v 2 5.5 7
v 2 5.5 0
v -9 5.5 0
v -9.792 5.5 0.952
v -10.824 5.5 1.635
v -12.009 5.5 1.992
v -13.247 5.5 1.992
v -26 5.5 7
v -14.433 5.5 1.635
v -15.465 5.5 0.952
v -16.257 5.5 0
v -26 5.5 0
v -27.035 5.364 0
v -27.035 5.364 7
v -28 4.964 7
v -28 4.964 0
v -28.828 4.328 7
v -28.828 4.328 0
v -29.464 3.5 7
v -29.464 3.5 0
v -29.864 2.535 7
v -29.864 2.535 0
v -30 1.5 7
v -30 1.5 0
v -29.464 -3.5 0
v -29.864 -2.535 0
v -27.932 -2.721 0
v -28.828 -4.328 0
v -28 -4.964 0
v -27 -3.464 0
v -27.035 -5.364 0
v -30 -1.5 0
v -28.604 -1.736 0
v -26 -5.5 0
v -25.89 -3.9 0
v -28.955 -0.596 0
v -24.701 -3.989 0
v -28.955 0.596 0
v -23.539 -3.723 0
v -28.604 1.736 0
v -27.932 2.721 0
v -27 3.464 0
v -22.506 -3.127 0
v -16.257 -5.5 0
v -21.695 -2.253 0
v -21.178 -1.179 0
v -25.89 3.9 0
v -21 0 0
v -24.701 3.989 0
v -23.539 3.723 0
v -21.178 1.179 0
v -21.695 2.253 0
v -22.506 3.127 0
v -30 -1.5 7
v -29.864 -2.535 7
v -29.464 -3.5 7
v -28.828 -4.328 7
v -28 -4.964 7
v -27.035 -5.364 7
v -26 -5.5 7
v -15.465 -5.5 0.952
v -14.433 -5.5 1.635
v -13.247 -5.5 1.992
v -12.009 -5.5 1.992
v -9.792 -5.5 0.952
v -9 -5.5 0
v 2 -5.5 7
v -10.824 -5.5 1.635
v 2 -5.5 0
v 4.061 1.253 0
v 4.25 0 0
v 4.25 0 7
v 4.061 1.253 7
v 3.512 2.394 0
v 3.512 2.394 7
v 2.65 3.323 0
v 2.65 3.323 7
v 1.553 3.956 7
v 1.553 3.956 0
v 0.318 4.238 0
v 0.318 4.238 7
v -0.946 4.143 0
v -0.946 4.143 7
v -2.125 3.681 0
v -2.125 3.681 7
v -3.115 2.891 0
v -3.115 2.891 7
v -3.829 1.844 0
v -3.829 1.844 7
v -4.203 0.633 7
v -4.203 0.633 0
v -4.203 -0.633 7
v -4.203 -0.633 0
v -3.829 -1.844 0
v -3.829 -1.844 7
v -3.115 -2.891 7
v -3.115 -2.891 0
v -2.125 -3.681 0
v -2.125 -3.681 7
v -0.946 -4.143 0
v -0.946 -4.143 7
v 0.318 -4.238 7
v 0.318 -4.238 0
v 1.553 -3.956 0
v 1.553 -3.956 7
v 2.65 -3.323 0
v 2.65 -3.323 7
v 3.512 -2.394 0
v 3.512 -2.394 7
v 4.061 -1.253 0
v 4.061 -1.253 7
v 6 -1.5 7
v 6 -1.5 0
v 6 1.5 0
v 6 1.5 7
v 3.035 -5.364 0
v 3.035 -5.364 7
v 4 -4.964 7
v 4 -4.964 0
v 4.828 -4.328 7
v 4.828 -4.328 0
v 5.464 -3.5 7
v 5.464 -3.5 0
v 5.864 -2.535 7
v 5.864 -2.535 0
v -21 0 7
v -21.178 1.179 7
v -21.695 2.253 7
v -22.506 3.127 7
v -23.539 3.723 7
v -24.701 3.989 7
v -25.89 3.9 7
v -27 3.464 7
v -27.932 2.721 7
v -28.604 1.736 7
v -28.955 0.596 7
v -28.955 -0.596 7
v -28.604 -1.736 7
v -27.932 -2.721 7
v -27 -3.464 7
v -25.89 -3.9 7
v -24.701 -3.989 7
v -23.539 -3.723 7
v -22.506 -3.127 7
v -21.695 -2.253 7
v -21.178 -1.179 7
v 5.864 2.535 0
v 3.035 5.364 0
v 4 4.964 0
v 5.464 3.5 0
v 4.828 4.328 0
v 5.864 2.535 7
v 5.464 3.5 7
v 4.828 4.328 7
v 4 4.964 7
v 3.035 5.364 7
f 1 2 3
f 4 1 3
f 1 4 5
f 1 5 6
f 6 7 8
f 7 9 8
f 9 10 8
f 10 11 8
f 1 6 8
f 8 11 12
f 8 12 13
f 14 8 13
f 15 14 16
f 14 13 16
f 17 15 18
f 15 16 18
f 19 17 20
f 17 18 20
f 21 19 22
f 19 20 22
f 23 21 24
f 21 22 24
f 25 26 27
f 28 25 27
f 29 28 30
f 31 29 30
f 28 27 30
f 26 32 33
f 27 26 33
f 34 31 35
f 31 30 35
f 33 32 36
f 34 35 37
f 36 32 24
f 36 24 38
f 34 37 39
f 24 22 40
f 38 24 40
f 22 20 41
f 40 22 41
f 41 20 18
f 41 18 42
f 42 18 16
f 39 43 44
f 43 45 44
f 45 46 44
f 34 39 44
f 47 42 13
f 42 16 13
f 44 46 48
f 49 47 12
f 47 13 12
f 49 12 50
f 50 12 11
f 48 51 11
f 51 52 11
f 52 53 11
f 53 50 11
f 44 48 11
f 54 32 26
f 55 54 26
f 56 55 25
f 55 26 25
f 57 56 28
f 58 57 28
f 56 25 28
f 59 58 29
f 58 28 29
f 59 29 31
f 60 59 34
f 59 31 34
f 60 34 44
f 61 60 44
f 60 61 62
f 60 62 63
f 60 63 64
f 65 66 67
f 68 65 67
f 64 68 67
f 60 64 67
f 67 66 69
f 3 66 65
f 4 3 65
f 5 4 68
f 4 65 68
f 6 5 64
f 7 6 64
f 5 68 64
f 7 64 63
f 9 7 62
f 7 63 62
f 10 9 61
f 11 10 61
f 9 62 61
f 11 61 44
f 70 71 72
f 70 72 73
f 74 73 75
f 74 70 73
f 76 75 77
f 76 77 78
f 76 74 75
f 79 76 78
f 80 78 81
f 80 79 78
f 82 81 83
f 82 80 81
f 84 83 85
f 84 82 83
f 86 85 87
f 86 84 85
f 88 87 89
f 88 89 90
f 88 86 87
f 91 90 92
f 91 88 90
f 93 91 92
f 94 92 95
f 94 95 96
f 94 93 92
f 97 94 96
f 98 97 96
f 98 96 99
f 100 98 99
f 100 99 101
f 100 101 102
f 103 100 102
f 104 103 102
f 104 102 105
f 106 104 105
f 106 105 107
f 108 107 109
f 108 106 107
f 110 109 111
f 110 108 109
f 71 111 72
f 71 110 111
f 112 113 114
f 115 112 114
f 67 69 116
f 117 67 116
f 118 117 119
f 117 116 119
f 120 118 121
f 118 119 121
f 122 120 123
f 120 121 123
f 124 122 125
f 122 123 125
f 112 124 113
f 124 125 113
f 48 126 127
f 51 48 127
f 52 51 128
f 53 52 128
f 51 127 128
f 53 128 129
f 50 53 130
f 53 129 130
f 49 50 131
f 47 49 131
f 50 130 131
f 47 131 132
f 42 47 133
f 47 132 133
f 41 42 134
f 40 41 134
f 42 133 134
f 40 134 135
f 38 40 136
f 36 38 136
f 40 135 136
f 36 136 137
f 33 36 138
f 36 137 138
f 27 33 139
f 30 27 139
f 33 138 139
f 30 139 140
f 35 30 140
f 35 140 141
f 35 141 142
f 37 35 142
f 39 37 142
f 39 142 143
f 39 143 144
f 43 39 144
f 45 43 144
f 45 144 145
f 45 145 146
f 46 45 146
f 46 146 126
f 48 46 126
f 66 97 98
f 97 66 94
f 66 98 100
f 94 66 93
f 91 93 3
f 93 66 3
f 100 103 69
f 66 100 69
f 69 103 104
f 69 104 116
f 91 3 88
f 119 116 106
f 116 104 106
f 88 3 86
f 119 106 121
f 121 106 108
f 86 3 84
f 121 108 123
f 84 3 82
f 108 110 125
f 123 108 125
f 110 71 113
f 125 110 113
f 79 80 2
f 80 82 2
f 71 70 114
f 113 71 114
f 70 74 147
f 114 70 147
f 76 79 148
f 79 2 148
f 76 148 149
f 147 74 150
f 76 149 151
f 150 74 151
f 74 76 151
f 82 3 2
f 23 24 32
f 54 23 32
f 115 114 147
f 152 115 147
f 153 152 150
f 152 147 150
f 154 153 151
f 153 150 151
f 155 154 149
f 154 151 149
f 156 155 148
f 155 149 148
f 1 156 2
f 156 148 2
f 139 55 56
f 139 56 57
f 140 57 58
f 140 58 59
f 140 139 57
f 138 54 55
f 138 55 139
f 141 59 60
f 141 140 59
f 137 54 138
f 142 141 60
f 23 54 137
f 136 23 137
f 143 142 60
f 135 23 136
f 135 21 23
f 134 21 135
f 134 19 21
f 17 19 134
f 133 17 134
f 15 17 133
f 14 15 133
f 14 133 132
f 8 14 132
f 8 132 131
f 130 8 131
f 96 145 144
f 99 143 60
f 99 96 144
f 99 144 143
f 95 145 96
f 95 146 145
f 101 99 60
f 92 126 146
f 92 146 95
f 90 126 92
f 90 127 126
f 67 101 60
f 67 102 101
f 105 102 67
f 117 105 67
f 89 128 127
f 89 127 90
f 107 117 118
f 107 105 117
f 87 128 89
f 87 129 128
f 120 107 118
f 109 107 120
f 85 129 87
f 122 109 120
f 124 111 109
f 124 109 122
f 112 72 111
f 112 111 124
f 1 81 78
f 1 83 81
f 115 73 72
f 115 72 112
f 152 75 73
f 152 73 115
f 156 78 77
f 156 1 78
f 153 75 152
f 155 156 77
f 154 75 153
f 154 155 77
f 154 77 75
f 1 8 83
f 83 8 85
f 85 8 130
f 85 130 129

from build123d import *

# Parameters (mm, degrees)
F0_R     = 4.25
F1_DEPTH = 7
F3_DEPTH = 25
F4_R     = 4
F5_DEPTH = 25


with BuildPart() as f1:
    # F0 (on Top) → F1 (new body)
    with BuildSketch(Plane.XY):
        with BuildLine():
            Line((2, 5.5), (-26, 5.5))
            ThreePointArc((-26, 5.5), (-28.828427, 4.328427), (-30, 1.5))
            Line((-30, 1.5), (-30, -1.5))
            ThreePointArc((-30, -1.5), (-28.828427, -4.328427), (-26, -5.5))
            Line((-26, -5.5), (2, -5.5))
            ThreePointArc((2, -5.5), (4.828427, -4.328427), (6, -1.5))
            Line((6, -1.5), (6, 1.5))
            ThreePointArc((6, 1.5), (4.828427, 4.328427), (2, 5.5))
        make_face()
        Circle(F0_R, mode=Mode.SUBTRACT)
    extrude(amount=F1_DEPTH)

    # F2 (on face) → F3 (cut)
    with BuildSketch(Plane.XZ.offset(5.5)):
        with BuildLine():
            Line((-16.256757, 0), (-9, 0))
            ThreePointArc((-9, 0), (-12.628379, 2.037), (-16.256757, 0))
        make_face()
    extrude(amount=-F3_DEPTH, mode=Mode.SUBTRACT)

    # F4 (on face) → F5 (cut)
    with BuildSketch(Plane.XY.offset(7)):
        with Locations((-25, 0)):
            Circle(F4_R)
    extrude(amount=-F5_DEPTH, mode=Mode.SUBTRACT)


solid = f1.part
